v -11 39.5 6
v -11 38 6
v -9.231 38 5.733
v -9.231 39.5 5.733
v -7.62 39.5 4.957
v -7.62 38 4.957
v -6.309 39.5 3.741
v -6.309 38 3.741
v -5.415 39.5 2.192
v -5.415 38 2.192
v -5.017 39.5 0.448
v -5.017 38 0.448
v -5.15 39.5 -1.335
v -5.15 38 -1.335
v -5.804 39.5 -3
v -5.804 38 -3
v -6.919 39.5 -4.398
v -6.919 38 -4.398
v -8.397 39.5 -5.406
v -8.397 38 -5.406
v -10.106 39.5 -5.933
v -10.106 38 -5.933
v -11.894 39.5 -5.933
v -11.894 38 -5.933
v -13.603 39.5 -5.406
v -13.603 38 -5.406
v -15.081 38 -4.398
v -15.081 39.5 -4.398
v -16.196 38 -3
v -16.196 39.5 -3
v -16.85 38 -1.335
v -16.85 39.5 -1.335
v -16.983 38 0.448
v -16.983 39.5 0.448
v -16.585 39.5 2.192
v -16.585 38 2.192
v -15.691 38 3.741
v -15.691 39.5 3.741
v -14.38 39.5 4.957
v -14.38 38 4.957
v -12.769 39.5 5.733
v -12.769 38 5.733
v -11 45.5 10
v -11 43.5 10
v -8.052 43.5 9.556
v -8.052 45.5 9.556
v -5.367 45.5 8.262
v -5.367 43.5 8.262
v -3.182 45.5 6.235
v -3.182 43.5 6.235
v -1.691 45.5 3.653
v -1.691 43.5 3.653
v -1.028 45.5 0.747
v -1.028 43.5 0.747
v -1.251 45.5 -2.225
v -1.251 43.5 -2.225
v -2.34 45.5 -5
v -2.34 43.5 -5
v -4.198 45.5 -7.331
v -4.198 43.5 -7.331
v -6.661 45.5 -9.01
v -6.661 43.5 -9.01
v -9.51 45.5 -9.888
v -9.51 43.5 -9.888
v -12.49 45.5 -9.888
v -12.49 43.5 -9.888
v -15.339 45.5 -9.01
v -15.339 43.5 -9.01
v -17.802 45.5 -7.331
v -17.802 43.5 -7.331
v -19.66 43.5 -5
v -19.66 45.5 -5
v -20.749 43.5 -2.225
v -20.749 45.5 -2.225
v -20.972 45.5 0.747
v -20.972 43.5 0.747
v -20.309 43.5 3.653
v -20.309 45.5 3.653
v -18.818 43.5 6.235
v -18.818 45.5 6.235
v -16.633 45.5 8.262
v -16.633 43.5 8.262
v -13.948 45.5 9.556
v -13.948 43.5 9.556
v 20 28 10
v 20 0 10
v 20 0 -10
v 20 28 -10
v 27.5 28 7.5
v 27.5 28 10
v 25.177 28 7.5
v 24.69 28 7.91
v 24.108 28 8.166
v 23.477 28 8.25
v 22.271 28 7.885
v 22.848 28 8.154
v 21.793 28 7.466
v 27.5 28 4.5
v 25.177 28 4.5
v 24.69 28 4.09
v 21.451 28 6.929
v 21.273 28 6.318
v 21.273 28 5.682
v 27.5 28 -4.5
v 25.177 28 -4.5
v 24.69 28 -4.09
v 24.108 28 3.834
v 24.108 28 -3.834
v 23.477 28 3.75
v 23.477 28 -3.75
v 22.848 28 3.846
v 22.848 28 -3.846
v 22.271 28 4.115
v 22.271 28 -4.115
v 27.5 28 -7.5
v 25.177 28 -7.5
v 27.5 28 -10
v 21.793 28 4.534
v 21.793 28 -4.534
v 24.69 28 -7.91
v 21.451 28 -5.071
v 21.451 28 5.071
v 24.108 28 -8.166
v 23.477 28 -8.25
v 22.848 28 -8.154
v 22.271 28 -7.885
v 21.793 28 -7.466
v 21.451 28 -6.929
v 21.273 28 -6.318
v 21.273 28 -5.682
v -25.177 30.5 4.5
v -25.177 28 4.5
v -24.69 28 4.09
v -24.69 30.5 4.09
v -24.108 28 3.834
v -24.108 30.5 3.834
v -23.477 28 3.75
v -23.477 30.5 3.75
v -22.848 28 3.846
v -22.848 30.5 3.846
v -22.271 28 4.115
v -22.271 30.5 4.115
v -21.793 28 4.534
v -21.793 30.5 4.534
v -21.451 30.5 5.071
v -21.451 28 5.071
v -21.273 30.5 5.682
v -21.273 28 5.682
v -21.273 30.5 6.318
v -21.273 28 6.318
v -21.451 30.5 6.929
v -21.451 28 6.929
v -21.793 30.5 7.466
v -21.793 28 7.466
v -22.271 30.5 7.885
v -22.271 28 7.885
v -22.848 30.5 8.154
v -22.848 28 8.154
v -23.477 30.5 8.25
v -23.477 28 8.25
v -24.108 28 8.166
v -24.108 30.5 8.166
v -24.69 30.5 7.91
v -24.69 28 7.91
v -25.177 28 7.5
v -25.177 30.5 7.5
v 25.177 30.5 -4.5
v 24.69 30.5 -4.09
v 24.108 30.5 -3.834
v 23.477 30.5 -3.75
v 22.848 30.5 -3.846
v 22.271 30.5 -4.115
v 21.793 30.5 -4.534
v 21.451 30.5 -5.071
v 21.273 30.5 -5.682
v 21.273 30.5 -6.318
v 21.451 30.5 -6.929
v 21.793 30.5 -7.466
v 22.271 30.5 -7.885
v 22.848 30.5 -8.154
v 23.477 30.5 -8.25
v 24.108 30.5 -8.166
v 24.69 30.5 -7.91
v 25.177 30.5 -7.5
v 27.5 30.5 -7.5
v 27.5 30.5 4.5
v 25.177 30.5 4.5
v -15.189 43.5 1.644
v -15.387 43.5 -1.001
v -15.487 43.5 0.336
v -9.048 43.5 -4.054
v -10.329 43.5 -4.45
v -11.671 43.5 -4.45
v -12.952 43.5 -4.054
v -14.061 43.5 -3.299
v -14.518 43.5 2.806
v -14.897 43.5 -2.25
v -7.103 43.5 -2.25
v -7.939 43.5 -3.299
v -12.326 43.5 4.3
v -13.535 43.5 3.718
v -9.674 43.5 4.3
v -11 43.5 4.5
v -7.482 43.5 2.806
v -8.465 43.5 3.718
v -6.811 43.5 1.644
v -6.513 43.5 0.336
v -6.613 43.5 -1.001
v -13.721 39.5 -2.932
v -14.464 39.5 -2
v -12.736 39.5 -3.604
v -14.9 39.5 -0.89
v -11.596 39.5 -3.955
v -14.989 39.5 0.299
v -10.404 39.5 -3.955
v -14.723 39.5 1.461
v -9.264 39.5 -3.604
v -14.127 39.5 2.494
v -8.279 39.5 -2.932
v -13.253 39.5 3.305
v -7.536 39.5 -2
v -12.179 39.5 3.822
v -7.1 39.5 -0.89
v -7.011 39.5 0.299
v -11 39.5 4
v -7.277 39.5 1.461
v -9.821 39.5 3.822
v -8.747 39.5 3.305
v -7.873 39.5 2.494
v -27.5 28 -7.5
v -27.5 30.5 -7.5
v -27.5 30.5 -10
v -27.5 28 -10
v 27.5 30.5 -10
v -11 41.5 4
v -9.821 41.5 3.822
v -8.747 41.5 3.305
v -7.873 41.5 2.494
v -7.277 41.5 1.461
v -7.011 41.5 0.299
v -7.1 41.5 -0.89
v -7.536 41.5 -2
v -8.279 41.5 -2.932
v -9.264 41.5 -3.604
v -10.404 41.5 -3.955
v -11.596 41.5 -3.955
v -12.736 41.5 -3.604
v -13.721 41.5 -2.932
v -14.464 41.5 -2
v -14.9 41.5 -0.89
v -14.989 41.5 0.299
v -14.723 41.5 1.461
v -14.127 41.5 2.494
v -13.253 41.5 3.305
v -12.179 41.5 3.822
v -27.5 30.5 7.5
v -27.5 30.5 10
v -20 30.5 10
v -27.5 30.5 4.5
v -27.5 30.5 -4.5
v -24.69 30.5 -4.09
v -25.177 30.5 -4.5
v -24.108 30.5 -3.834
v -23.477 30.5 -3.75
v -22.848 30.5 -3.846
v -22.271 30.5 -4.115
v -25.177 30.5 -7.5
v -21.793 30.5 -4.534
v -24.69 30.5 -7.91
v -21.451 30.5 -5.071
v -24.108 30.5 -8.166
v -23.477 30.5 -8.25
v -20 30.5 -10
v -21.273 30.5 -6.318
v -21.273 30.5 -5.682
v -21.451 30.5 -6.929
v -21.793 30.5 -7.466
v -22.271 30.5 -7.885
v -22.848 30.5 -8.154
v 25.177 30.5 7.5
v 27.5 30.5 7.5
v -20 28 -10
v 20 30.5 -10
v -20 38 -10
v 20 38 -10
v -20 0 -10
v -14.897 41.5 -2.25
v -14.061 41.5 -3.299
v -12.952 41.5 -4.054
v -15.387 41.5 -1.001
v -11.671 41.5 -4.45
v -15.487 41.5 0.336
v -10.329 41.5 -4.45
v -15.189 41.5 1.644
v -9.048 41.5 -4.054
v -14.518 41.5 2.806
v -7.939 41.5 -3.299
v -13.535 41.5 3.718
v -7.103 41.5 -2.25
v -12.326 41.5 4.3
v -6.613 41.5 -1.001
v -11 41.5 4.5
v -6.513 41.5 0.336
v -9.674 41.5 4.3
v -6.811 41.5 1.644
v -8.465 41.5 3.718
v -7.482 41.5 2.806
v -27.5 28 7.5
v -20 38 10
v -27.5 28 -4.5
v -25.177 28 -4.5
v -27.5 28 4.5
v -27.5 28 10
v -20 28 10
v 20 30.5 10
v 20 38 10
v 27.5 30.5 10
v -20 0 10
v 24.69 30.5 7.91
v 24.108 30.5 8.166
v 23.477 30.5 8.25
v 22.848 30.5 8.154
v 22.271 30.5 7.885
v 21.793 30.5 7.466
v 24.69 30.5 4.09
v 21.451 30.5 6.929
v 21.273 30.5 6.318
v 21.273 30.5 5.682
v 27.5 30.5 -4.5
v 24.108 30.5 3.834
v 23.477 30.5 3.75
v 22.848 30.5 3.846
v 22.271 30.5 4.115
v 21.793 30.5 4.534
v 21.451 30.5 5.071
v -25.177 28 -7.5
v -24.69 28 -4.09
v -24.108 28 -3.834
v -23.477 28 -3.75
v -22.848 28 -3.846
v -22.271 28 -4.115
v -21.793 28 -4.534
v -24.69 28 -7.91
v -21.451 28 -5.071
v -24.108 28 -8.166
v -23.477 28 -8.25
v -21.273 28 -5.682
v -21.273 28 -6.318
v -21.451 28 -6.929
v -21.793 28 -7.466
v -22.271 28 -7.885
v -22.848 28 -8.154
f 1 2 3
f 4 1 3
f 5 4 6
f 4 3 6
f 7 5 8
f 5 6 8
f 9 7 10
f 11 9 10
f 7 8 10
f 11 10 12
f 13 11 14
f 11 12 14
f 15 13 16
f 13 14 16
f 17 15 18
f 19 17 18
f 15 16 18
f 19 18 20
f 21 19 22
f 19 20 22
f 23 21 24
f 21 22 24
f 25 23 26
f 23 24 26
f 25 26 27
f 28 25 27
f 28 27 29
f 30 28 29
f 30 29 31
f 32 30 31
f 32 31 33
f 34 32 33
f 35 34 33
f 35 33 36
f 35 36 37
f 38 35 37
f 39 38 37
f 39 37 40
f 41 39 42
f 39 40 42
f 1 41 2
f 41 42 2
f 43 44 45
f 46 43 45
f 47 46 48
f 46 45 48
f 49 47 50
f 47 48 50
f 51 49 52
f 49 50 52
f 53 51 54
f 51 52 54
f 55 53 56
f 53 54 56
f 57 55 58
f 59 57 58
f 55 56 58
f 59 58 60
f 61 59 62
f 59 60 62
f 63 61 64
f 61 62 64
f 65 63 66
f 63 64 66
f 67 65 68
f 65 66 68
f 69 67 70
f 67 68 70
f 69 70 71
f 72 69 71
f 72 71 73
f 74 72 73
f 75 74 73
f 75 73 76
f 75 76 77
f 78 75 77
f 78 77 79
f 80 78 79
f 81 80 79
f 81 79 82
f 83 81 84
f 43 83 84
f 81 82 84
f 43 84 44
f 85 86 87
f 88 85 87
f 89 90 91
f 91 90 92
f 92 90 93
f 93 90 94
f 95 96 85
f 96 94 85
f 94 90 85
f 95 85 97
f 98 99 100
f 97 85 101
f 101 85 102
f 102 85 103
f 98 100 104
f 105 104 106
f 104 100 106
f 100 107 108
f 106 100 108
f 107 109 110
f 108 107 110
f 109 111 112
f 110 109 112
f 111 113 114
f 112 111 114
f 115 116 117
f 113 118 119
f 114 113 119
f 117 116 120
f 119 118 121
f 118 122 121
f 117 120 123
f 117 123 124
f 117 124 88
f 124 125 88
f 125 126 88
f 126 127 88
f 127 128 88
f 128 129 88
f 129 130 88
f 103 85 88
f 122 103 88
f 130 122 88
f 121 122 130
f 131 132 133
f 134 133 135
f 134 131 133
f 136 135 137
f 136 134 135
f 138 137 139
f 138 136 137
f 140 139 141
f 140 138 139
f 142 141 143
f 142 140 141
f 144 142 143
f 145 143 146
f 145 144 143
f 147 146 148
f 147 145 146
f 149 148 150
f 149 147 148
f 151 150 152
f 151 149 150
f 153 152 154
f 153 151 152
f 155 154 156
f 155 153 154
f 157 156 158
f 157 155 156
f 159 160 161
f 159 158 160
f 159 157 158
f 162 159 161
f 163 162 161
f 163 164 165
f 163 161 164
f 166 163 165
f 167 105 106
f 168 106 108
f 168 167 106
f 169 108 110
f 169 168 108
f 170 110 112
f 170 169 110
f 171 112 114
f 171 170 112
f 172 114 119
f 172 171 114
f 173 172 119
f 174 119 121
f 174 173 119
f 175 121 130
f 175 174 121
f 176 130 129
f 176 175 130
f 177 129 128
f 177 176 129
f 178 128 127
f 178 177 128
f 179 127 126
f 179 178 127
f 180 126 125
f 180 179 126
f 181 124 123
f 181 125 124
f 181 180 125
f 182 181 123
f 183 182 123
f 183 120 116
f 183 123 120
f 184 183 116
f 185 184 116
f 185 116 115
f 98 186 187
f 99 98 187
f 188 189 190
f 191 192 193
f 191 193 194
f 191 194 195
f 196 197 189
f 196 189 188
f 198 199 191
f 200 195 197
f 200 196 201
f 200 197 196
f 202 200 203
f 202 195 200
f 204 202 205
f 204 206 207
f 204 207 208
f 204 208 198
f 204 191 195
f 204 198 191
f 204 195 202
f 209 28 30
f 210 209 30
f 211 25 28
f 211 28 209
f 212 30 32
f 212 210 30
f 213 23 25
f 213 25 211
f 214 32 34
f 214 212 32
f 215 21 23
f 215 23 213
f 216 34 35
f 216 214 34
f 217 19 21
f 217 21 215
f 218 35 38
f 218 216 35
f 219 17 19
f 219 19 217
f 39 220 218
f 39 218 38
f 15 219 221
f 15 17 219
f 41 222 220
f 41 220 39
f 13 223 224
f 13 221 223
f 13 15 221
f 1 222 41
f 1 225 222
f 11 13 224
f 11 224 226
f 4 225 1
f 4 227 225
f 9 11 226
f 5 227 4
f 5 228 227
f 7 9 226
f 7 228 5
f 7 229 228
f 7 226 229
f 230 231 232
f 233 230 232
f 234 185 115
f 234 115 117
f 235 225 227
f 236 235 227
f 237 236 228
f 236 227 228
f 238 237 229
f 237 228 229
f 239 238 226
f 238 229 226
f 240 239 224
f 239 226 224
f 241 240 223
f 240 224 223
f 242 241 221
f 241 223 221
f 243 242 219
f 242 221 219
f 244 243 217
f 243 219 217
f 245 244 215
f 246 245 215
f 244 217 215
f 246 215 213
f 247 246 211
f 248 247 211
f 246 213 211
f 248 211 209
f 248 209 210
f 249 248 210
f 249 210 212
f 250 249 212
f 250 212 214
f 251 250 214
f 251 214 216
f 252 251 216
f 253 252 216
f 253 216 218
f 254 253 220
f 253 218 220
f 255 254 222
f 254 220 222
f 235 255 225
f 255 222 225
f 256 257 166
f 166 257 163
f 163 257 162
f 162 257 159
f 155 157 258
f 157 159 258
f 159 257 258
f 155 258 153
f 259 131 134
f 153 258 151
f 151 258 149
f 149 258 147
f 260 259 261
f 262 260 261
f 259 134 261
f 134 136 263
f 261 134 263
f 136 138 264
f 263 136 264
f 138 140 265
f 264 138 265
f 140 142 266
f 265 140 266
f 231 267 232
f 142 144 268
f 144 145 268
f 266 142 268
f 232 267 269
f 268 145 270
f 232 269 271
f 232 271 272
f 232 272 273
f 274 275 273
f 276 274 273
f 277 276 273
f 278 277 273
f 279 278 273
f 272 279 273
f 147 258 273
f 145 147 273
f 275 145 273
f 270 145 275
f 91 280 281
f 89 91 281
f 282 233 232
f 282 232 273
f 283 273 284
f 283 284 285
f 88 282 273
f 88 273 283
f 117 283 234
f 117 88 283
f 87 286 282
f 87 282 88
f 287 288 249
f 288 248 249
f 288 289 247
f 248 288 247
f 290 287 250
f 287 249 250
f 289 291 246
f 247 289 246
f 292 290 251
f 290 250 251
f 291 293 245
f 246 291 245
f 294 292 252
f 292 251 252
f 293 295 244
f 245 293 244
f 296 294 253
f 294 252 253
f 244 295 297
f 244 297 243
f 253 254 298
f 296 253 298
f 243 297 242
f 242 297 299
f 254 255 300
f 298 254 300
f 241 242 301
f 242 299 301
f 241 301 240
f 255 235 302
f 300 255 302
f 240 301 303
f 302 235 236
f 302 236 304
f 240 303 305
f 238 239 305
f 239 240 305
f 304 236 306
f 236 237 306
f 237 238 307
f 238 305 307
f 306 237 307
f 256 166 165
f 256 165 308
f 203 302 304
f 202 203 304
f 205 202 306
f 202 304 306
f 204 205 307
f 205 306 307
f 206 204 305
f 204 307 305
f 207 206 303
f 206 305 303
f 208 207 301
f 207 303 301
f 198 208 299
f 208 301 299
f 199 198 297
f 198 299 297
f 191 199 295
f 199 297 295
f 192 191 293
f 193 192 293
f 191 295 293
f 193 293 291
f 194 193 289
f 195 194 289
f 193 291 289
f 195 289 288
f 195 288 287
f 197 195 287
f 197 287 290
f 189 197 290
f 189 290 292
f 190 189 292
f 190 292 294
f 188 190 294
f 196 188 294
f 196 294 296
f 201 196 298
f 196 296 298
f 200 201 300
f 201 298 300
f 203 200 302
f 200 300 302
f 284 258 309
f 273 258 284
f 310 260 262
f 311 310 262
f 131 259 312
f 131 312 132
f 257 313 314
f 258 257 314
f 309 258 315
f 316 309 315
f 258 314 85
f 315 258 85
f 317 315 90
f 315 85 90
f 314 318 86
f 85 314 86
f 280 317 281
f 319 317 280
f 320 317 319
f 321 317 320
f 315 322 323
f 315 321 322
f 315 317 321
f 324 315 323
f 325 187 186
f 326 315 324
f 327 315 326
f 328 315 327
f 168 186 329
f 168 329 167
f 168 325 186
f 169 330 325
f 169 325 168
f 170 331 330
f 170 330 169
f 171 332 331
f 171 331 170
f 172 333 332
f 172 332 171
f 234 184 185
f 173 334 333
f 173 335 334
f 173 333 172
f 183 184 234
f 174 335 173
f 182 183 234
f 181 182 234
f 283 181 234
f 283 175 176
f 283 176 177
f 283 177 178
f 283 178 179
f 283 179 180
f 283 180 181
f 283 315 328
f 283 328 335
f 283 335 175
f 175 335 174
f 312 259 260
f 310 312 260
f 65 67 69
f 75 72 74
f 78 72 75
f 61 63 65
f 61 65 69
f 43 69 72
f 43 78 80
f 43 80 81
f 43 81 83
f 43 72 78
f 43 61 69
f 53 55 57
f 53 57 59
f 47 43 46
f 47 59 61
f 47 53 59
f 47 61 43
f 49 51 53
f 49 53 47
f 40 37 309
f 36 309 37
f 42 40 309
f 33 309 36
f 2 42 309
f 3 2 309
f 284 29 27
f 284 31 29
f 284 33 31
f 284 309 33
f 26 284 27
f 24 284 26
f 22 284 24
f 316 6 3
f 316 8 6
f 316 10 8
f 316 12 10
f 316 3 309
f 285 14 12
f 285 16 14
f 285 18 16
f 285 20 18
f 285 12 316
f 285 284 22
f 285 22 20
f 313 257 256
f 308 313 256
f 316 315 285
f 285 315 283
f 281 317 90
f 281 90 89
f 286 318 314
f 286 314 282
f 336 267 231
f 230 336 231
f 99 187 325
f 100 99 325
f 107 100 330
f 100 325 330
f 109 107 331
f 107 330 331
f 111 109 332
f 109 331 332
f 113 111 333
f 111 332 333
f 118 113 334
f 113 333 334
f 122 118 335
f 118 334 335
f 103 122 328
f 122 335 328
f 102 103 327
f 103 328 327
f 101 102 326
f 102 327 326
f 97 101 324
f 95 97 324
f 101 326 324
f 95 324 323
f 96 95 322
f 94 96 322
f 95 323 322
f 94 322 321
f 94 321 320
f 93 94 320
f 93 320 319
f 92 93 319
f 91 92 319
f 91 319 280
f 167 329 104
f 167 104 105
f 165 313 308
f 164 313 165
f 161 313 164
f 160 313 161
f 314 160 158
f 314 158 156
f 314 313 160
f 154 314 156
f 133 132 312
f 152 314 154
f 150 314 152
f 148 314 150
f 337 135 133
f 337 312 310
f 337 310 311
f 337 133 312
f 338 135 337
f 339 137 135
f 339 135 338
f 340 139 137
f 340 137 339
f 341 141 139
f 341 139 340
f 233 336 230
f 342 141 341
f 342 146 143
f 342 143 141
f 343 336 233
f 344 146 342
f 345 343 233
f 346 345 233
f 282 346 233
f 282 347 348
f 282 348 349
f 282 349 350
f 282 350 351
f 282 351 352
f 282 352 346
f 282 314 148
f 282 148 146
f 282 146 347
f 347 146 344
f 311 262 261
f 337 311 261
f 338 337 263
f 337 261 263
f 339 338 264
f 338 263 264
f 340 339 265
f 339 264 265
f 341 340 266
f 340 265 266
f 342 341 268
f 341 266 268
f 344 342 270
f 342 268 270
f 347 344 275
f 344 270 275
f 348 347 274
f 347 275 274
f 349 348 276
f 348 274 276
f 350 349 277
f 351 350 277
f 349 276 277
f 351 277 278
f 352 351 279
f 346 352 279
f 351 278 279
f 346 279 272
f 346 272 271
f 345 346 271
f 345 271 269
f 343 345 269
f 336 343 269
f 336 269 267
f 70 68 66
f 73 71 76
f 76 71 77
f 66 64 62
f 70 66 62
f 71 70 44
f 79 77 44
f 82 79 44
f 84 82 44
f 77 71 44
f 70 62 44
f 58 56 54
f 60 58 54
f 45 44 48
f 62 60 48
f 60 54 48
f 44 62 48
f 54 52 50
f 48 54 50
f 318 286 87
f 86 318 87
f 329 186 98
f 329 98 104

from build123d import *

# Parameters (mm, degrees)
SKETCH1_W            = 40
SKETCH1_H            = 20
BOSS_EXTRUDE1_DEPTH  = 38
SKETCH2_W            = 20
SKETCH2_H            = 2.5
BOSS_EXTRUDE2_DEPTH  = 7.5
CUT_EXTRUDE1_DEPTH   = 43.267008411
MIRROR2_COPY_1_DEPTH = 43.267008411
SKETCH4_R            = 6
BOSS_EXTRUDE3_DEPTH  = 1.5
SKETCH6_R            = 4
BOSS_EXTRUDE4_DEPTH  = 2
SKETCH7_R            = 4.5
BOSS_EXTRUDE5_DEPTH  = 2
SKETCH8_R            = 10
BOSS_EXTRUDE6_DEPTH  = 2


with BuildPart() as part:
    # Sketch1 → Boss-Extrude1 (new body)
    with BuildSketch(Plane(origin=(0, 0, 0), x_dir=(1, 0, 0), z_dir=(0, 1, 0))):
        Rectangle(SKETCH1_W, SKETCH1_H)
    extrude(amount=BOSS_EXTRUDE1_DEPTH)

    # Sketch2 → Boss-Extrude2 (add)
    with BuildSketch(Plane(origin=(20, 0, 0), x_dir=(0, 0, -1), z_dir=(1, 0, 0))):
        with Locations((0, 29.25)):
            Rectangle(SKETCH2_W, SKETCH2_H)
    boss_extrude2 = extrude(amount=BOSS_EXTRUDE2_DEPTH)

    # Sketch3 → Cut-Extrude1 (cut, through all)
    with BuildSketch(Plane(origin=(0, 30.5, 0), x_dir=(1, 0, 0), z_dir=(0, 1, 0))):
        with BuildLine():
            Line((27.5, -7.5), (27.5, -4.5))
            Line((27.5, -4.5), (25.177050983, -4.5))
            ThreePointArc((25.177050983, -4.5), (21.25, -6), (25.177050983, -7.5))
            Line((25.177050983, -7.5), (27.5, -7.5))
        make_face()
    cut_extrude1 = extrude(amount=-CUT_EXTRUDE1_DEPTH, mode=Mode.SUBTRACT)

    # Mirror1: Cut-Extrude1 across plane
    add(cut_extrude1.mirror(Plane.XY), mode=Mode.SUBTRACT)

    # Mirror2: Boss-Extrude2, Cut-Extrude1 across plane
    add(boss_extrude2.mirror(Plane(origin=(0, 0, 0), x_dir=(0, 0, 1), z_dir=(1, 0, 0))))
    add(cut_extrude1.mirror(Plane(origin=(0, 0, 0), x_dir=(0, 0, 1), z_dir=(1, 0, 0))), mode=Mode.SUBTRACT)

    # Mirror2 copy 1 sketch → Mirror2 copy 1 (cut, through all)
    with BuildSketch(Plane(origin=(0, 30.5, 0), x_dir=(-1, 0, 0), z_dir=(0, 1, 0))):
        with BuildLine():
            Line((27.5, -7.5), (27.5, -4.5))
            Line((27.5, -4.5), (25.177050983, -4.5))
            ThreePointArc((25.177050983, -4.5), (21.25, -6), (25.177050983, -7.5))
            Line((25.177050983, -7.5), (27.5, -7.5))
        make_face()
    extrude(amount=-MIRROR2_COPY_1_DEPTH, mode=Mode.SUBTRACT)

    # Sketch4 → Boss-Extrude3 (add)
    with BuildSketch(Plane(origin=(0, 38, 0), x_dir=(1, 0, 0), z_dir=(0, 1, 0))):
        with Locations(Location((-11, 0, 0), (0, 0, 270))):
            Circle(SKETCH4_R)
    extrude(amount=BOSS_EXTRUDE3_DEPTH)

    # Sketch6 → Boss-Extrude4 (add)
    with BuildSketch(Plane(origin=(0, 39.5, 0), x_dir=(1, 0, 0), z_dir=(0, 1, 0))):
        with Locations(Location((-11, 0, 0), (0, 0, 270))):
            Circle(SKETCH6_R)
    extrude(amount=BOSS_EXTRUDE4_DEPTH)

    # Sketch7 → Boss-Extrude5 (add)
    with BuildSketch(Plane(origin=(0, 41.5, 0), x_dir=(1, 0, 0), z_dir=(0, 1, 0))):
        with Locations(Location((-11, 0, 0), (0, 0, 270))):
            Circle(SKETCH7_R)
    extrude(amount=BOSS_EXTRUDE5_DEPTH)


with BuildPart() as body_2:
    # Sketch8 → Boss-Extrude6 (new body)
    with BuildSketch(Plane(origin=(0, 43.5, 0), x_dir=(1, 0, 0), z_dir=(0, 1, 0))):
        with Locations(Location((-11, 0, 0), (0, 0, 270))):
            Circle(SKETCH8_R)
    extrude(amount=BOSS_EXTRUDE6_DEPTH)


solid = Compound([part.part, body_2.part])
